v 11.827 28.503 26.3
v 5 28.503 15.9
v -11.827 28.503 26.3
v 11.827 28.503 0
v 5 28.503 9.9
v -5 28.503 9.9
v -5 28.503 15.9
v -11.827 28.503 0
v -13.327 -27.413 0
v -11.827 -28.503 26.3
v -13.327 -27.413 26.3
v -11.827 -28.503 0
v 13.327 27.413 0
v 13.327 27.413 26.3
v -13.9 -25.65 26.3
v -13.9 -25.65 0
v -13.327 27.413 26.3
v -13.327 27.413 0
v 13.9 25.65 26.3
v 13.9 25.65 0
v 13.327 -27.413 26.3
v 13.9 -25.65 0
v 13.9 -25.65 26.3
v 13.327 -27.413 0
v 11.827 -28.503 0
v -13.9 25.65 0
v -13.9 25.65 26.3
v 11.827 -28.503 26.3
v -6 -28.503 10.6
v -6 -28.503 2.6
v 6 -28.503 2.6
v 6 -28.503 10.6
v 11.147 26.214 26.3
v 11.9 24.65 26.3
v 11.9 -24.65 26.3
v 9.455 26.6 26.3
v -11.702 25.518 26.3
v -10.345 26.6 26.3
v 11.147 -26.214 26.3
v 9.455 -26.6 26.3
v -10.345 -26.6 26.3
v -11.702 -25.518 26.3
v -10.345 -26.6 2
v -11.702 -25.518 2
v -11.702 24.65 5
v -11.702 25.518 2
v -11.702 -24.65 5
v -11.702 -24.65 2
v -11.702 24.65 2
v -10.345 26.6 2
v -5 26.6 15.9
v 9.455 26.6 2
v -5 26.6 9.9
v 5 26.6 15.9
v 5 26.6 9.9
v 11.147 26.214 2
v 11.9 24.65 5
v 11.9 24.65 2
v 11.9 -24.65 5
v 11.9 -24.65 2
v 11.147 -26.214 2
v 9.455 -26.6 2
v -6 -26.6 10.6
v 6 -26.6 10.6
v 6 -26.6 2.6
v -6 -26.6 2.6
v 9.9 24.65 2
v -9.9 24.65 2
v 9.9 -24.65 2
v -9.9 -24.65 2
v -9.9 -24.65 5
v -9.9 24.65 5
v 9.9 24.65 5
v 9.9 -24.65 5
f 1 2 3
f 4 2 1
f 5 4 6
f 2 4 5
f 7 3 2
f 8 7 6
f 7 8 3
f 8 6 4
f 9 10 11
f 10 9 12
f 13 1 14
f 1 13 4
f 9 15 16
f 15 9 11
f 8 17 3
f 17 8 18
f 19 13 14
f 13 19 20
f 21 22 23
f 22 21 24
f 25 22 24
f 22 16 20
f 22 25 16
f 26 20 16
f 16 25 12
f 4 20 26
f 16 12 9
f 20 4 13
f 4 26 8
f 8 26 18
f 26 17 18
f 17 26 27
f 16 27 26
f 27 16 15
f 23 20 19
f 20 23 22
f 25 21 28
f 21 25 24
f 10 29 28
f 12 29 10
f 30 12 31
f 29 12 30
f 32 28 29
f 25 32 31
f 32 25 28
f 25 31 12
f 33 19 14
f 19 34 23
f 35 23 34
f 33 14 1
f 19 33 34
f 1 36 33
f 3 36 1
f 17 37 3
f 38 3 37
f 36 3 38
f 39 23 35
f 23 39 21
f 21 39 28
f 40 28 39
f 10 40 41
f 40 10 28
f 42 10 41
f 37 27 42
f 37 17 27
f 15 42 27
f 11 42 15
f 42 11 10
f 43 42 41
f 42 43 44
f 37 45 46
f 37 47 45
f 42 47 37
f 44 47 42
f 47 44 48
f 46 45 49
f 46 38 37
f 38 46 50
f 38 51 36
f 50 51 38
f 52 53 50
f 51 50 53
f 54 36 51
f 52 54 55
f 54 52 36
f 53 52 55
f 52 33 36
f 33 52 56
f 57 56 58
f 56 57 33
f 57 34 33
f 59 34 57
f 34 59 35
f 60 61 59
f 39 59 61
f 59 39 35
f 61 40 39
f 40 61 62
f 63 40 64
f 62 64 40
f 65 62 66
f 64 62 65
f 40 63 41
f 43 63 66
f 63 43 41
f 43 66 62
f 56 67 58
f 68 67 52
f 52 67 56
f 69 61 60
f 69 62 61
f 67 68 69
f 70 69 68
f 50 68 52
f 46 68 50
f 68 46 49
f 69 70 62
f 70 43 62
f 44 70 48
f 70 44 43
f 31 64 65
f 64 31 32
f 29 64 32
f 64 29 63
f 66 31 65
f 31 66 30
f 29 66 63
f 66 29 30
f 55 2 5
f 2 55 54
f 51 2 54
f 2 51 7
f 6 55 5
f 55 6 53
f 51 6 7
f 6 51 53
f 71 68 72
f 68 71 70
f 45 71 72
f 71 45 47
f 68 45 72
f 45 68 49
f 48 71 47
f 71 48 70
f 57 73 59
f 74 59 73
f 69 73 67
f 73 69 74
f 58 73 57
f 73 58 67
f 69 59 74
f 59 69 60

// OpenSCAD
// SPDX-License-Identifier: CC-BY-NC-SA-4.0
// Copyright (c) 2026 12113775 Canada Inc. Non-commercial use only; credit required. See LICENSE.
//
// Two unrelated builds share this file:
//   - sensor_mount: the SEN55 adapter + SCD41, in an open vented bracket (they need real
//     airflow and must NOT go in a sealed box). Needed by BOTH builds below.
//   - box/lid/fit_test: an enclosure for a *second*, standalone ESP32 (Adafruit Feather ESP32
//     V2 + Adalogger FeatherWing) — only needed for firmware/airquality_logger, the pricier
//     separate-board build. If you merged the sensors into kp125_round_display.ino instead
//     (ENABLE_AIR_QUALITY=1, the cheaper, recommended path — see docs/parts-airquality-logger.md),
//     you do NOT need box/lid/fit_test: there's no second board, and the round display already
//     has its own stand from display_stand.scad.
//
// Open in OpenSCAD, set PART, F6 to render, F7 to export STL.
// All dimensions in mm.
//
// STATUS: renders clean (manifold, OpenSCAD 2026.06). NOT yet test-printed, NOT yet fitted to
// real boards. feather_w/feather_l/feather_t and wing_* come from Adafruit's own published
// dimensions for these exact products (PID 5400, PID 2922) — fairly solid. sen55_adapter_*
// and scd41_board_* are PLACEHOLDERS (no published dimension found for those two boards at
// design time) — the sensor_mount is deliberately a loose, generic perforated tray rather than
// a snug pocket for exactly this reason. Print PART="fit_test" first and check the stack
// actually slides into the box before committing to a full print; measure the two sensor
// boards with calipers and tighten sensor_mount's slot sizes once you have them in hand —
// same workflow display_stand.scad used for board_d/stack_t before its first real print.
//
// Print orientation: box floor-down (open top up) — no supports; the two cable slots bridge
// cleanly like the main stand's cable tunnel. lid flat-side down, spigot up — no supports.
// sensor_mount flat, vent slots up.

PART = "box";   // "box" (base, open-top tray for the Feather+Wing stack), "lid",
                // "sensor_mount" (vented bracket for the SEN55 adapter + SCD41), "fit_test", "both"

// ---------- Feather ESP32 V2 + Adalogger FeatherWing stack (Adafruit PID 5400 + PID 2922) ----------
feather_w     = 22.8;  // board width (both the Feather and the Wing share this — standard Feather footprint)
feather_l     = 52.3;  // Feather length
feather_t     = 7.2;   // Feather board + components thickness (rounded up slightly for the USB-C socket)
wing_l        = 50.8;  // Adalogger FeatherWing length (slightly shorter than the Feather — fine, centred)
wing_t        = 1.6;   // Wing board thickness
header_gap    = 9.0;   // Feather-to-Wing gap once stacked on female headers (standard Feather stacking height)
stack_t       = feather_t + header_gap + wing_t + 2;   // total stack height + a little slack

// ---------- box (tray + lid, friction-fit like display_stand.scad's cap) ----------
clr       = 0.5;   // clearance around the board stack footprint (loosen/tighten per your printer)
wall      = 2.0;
floor_t   = 2.0;
lid_t     = 2.0;
spig      = 2.5;         // lid spigot length into the box wall
cap_fit   = 0.3;         // crush-rib interference (same idea as display_stand.scad's cap_fit)
n_ribs    = 6;           // crush ribs around the lid spigot

usb_slot_w = 12;   // USB-C cable clearance slot, short end of the box
usb_slot_h = 8;
cable_slot_w = 10; // slot for the 2 STEMMA QT cables leaving to the sensor_mount, other short end
cable_slot_h = 6;

box_in_w = feather_w + clr * 2;
box_in_l = feather_l + clr * 2;
box_out_w = box_in_w + wall * 2;
box_out_l = box_in_l + wall * 2;

// Standoffs that the Feather's own mounting holes would normally use — since this board's exact
// hole coordinates weren't confirmed at design time, these are plain corner rails (friction
// grip on the board edge, not screw posts). Fine for something that sits still on a shelf;
// revisit with real screw posts if this will be handled/moved often.
rail_w = 2.0;
rail_h = 3.0;

// ---------- sensor_mount: open bracket for the SEN55 adapter + SCD41 breakout ----------
// PLACEHOLDERS — no confirmed dimensions for these two specific boards at design time.
// Measure both with calipers and tighten slot_w/slot_l/slot_gap before trusting the fit;
// as shipped this is intentionally loose (a perforated tray + zip-tie anchors, not a pocket),
// so a few mm of error here just means a slightly loose tray, not a part that doesn't fit.
sen55_adapter_w = 18;   // typical small Adafruit STEMMA QT breakout footprint — CONFIRM
sen55_adapter_l = 26;
scd41_board_w   = 23;   // Sensirion SCD41 bare module is ~22.8 x 25.5mm; the Adafruit breakout
scd41_board_l   = 26;   // is a little larger to carry the STEMMA QT connectors — CONFIRM

mount_wall   = 1.6;
mount_floor  = 1.6;
mount_gap    = 4;     // gap between the two board slots
vent_slot_w  = 2.5;   // width of each vent slot in the floor (under the SEN55's fan + general airflow)
vent_slot_pitch = 5;

tie_slot  = [4.5, 2.0];   // same cable-tie slot as display_stand.scad's tie_anchors
tie_span  = 11;

// =========================================================================

module rounded_rect(w, l, r) {
  hull() for (x = [-w/2 + r, w/2 - r]) for (y = [-l/2 + r, l/2 - r])
    translate([x, y]) circle(r = r);
}

// Small ribs on the spigot's two long sides, each sticking out cap_fit beyond the otherwise-
// undersized spigot, so only the ribs take the interference on insertion (same idea as
// display_stand.scad's cap crush ribs — six extended ribs, cap_fit 0.3 — adapted to a
// rectangular spigot instead of that design's round one).
module spigot_ribs(w, l, h, n_per_side, rib_h) {
  for (i = [0 : n_per_side - 1]) {
    y = -l/2 + (i + 0.5) * l / n_per_side;
    translate([ w/2, y, h/2]) cube([cap_fit * 2, rib_h, h], center = true);
    translate([-w/2, y, h/2]) cube([cap_fit * 2, rib_h, h], center = true);
  }
}

// The lid's spigot footprint: a touch undersized so it slides into the box's cavity, with
// spigot_ribs() (called from both lid() and fit_test()) taking up the actual interference.
spigot_w = box_in_w - 1.0;
spigot_l = box_in_l - 1.0;

module box() {
  difference() {
    union() {
      // outer shell
      linear_extrude(height = floor_t + stack_t + wall)
        rounded_rect(box_out_w, box_out_l, 3);
      // lip for the lid to spigot into
      translate([0, 0, floor_t + stack_t + wall])
        linear_extrude(height = spig)
          difference() {
            rounded_rect(box_out_w, box_out_l, 3);
            rounded_rect(box_in_w, box_in_l, 2);
          }
    }
    // hollow interior
    translate([0, 0, floor_t])
      linear_extrude(height = stack_t + wall + spig + 1)
        rounded_rect(box_in_w, box_in_l, 2);
    // USB-C cable slot, one short end, at Feather-socket height (near the floor)
    translate([0, -box_out_l/2 + wall/2, floor_t + feather_t/2 + 1])
      cube([usb_slot_w, wall * 3, usb_slot_h], center = true);
    // STEMMA QT cable pass-through, the other short end
    translate([0, box_out_l/2 - wall/2, floor_t + stack_t/2 + 1])
      cube([cable_slot_w, wall * 3, cable_slot_h], center = true);
  }
  // board-edge retaining rails, inside the floor
  for (x = [-box_in_w/2 + rail_w/2, box_in_w/2 - rail_w/2])
    translate([x, 0, floor_t + rail_h/2])
      cube([rail_w, box_in_l - 4, rail_h], center = true);
}

module lid() {
  union() {
    linear_extrude(height = lid_t)
      rounded_rect(box_out_w, box_out_l, 3);
    translate([0, 0, lid_t]) {
      linear_extrude(height = spig)
        difference() {
          rounded_rect(spigot_w, spigot_l, 2);
          rounded_rect(spigot_w - wall, spigot_l - wall, 1.5);
        }
      spigot_ribs(spigot_w, spigot_l, spig, n_ribs / 2, 3);
    }
  }
}

module sensor_mount() {
  total_w = sen55_adapter_w + scd41_board_w + mount_gap + mount_wall * 3;
  total_l = max(sen55_adapter_l, scd41_board_l) + mount_wall * 2;
  difference() {
    linear_extrude(height = mount_floor)
      rounded_rect(total_w, total_l, 2);
    // vent slots across the whole floor — airflow matters more than a snug pocket here
    for (x = [-total_w/2 + 4 : vent_slot_pitch : total_w/2 - 4])
      translate([x, 0, -0.5])
        linear_extrude(height = mount_floor + 1)
          square([vent_slot_w, total_l - 6], center = true);
  }
  // low edge rails marking each board's slot (not a snug pocket — see note above)
  rail_h2 = 2.5;
  x0 = -total_w/2 + mount_wall + sen55_adapter_w/2;
  x1 = x0 + sen55_adapter_w/2 + mount_gap/2 + mount_wall/2 + scd41_board_w/2;
  for (cx = [x0, x1])
    for (dx = [-1, 1])
      translate([cx + dx * (sen55_adapter_w/2 - 1), 0, rail_h2/2])
        cube([2, total_l - 6, rail_h2], center = true);
  // cable-tie anchor pair at one end, to strap this to a shelf edge or printer frame
  translate([0, -total_l/2 + 6, -0.1])
    for (dx = [-tie_span/2, tie_span/2])
      translate([dx, 0, 0])
        linear_extrude(height = mount_floor + 0.2)
          square([tie_slot[0], tie_slot[1]], center = true);
}

module fit_test() {
  // Quick print: a short collar matching the box's wall/lip profile, and a short plug matching
  // the lid's spigot + crush ribs, side by side — print both, press them together by hand, check
  // cap_fit before committing to the full box (same idea as display_stand.scad's fit_test ring).
  test_h = 6;
  collar_x = -(box_out_w/2 + 6);
  translate([collar_x, 0, 0])
    linear_extrude(height = test_h)
      difference() { rounded_rect(box_out_w, box_out_l, 3); rounded_rect(box_in_w, box_in_l, 2); }
  plug_x = box_out_w/2 + 6;
  translate([plug_x, 0, 0]) {
    linear_extrude(height = test_h)
      difference() {
        rounded_rect(spigot_w, spigot_l, 2);
        rounded_rect(spigot_w - wall, spigot_l - wall, 1.5);
      }
    spigot_ribs(spigot_w, spigot_l, test_h, n_ribs / 2, 3);
  }
}

if (PART == "box") box();
else if (PART == "lid") lid();
else if (PART == "sensor_mount") sensor_mount();
else if (PART == "fit_test") fit_test();
else if (PART == "both") { box(); translate([box_out_w + 10, 0, 0]) lid(); translate([-(sen55_adapter_w + scd41_board_w + 40), 0, 0]) sensor_mount(); }
